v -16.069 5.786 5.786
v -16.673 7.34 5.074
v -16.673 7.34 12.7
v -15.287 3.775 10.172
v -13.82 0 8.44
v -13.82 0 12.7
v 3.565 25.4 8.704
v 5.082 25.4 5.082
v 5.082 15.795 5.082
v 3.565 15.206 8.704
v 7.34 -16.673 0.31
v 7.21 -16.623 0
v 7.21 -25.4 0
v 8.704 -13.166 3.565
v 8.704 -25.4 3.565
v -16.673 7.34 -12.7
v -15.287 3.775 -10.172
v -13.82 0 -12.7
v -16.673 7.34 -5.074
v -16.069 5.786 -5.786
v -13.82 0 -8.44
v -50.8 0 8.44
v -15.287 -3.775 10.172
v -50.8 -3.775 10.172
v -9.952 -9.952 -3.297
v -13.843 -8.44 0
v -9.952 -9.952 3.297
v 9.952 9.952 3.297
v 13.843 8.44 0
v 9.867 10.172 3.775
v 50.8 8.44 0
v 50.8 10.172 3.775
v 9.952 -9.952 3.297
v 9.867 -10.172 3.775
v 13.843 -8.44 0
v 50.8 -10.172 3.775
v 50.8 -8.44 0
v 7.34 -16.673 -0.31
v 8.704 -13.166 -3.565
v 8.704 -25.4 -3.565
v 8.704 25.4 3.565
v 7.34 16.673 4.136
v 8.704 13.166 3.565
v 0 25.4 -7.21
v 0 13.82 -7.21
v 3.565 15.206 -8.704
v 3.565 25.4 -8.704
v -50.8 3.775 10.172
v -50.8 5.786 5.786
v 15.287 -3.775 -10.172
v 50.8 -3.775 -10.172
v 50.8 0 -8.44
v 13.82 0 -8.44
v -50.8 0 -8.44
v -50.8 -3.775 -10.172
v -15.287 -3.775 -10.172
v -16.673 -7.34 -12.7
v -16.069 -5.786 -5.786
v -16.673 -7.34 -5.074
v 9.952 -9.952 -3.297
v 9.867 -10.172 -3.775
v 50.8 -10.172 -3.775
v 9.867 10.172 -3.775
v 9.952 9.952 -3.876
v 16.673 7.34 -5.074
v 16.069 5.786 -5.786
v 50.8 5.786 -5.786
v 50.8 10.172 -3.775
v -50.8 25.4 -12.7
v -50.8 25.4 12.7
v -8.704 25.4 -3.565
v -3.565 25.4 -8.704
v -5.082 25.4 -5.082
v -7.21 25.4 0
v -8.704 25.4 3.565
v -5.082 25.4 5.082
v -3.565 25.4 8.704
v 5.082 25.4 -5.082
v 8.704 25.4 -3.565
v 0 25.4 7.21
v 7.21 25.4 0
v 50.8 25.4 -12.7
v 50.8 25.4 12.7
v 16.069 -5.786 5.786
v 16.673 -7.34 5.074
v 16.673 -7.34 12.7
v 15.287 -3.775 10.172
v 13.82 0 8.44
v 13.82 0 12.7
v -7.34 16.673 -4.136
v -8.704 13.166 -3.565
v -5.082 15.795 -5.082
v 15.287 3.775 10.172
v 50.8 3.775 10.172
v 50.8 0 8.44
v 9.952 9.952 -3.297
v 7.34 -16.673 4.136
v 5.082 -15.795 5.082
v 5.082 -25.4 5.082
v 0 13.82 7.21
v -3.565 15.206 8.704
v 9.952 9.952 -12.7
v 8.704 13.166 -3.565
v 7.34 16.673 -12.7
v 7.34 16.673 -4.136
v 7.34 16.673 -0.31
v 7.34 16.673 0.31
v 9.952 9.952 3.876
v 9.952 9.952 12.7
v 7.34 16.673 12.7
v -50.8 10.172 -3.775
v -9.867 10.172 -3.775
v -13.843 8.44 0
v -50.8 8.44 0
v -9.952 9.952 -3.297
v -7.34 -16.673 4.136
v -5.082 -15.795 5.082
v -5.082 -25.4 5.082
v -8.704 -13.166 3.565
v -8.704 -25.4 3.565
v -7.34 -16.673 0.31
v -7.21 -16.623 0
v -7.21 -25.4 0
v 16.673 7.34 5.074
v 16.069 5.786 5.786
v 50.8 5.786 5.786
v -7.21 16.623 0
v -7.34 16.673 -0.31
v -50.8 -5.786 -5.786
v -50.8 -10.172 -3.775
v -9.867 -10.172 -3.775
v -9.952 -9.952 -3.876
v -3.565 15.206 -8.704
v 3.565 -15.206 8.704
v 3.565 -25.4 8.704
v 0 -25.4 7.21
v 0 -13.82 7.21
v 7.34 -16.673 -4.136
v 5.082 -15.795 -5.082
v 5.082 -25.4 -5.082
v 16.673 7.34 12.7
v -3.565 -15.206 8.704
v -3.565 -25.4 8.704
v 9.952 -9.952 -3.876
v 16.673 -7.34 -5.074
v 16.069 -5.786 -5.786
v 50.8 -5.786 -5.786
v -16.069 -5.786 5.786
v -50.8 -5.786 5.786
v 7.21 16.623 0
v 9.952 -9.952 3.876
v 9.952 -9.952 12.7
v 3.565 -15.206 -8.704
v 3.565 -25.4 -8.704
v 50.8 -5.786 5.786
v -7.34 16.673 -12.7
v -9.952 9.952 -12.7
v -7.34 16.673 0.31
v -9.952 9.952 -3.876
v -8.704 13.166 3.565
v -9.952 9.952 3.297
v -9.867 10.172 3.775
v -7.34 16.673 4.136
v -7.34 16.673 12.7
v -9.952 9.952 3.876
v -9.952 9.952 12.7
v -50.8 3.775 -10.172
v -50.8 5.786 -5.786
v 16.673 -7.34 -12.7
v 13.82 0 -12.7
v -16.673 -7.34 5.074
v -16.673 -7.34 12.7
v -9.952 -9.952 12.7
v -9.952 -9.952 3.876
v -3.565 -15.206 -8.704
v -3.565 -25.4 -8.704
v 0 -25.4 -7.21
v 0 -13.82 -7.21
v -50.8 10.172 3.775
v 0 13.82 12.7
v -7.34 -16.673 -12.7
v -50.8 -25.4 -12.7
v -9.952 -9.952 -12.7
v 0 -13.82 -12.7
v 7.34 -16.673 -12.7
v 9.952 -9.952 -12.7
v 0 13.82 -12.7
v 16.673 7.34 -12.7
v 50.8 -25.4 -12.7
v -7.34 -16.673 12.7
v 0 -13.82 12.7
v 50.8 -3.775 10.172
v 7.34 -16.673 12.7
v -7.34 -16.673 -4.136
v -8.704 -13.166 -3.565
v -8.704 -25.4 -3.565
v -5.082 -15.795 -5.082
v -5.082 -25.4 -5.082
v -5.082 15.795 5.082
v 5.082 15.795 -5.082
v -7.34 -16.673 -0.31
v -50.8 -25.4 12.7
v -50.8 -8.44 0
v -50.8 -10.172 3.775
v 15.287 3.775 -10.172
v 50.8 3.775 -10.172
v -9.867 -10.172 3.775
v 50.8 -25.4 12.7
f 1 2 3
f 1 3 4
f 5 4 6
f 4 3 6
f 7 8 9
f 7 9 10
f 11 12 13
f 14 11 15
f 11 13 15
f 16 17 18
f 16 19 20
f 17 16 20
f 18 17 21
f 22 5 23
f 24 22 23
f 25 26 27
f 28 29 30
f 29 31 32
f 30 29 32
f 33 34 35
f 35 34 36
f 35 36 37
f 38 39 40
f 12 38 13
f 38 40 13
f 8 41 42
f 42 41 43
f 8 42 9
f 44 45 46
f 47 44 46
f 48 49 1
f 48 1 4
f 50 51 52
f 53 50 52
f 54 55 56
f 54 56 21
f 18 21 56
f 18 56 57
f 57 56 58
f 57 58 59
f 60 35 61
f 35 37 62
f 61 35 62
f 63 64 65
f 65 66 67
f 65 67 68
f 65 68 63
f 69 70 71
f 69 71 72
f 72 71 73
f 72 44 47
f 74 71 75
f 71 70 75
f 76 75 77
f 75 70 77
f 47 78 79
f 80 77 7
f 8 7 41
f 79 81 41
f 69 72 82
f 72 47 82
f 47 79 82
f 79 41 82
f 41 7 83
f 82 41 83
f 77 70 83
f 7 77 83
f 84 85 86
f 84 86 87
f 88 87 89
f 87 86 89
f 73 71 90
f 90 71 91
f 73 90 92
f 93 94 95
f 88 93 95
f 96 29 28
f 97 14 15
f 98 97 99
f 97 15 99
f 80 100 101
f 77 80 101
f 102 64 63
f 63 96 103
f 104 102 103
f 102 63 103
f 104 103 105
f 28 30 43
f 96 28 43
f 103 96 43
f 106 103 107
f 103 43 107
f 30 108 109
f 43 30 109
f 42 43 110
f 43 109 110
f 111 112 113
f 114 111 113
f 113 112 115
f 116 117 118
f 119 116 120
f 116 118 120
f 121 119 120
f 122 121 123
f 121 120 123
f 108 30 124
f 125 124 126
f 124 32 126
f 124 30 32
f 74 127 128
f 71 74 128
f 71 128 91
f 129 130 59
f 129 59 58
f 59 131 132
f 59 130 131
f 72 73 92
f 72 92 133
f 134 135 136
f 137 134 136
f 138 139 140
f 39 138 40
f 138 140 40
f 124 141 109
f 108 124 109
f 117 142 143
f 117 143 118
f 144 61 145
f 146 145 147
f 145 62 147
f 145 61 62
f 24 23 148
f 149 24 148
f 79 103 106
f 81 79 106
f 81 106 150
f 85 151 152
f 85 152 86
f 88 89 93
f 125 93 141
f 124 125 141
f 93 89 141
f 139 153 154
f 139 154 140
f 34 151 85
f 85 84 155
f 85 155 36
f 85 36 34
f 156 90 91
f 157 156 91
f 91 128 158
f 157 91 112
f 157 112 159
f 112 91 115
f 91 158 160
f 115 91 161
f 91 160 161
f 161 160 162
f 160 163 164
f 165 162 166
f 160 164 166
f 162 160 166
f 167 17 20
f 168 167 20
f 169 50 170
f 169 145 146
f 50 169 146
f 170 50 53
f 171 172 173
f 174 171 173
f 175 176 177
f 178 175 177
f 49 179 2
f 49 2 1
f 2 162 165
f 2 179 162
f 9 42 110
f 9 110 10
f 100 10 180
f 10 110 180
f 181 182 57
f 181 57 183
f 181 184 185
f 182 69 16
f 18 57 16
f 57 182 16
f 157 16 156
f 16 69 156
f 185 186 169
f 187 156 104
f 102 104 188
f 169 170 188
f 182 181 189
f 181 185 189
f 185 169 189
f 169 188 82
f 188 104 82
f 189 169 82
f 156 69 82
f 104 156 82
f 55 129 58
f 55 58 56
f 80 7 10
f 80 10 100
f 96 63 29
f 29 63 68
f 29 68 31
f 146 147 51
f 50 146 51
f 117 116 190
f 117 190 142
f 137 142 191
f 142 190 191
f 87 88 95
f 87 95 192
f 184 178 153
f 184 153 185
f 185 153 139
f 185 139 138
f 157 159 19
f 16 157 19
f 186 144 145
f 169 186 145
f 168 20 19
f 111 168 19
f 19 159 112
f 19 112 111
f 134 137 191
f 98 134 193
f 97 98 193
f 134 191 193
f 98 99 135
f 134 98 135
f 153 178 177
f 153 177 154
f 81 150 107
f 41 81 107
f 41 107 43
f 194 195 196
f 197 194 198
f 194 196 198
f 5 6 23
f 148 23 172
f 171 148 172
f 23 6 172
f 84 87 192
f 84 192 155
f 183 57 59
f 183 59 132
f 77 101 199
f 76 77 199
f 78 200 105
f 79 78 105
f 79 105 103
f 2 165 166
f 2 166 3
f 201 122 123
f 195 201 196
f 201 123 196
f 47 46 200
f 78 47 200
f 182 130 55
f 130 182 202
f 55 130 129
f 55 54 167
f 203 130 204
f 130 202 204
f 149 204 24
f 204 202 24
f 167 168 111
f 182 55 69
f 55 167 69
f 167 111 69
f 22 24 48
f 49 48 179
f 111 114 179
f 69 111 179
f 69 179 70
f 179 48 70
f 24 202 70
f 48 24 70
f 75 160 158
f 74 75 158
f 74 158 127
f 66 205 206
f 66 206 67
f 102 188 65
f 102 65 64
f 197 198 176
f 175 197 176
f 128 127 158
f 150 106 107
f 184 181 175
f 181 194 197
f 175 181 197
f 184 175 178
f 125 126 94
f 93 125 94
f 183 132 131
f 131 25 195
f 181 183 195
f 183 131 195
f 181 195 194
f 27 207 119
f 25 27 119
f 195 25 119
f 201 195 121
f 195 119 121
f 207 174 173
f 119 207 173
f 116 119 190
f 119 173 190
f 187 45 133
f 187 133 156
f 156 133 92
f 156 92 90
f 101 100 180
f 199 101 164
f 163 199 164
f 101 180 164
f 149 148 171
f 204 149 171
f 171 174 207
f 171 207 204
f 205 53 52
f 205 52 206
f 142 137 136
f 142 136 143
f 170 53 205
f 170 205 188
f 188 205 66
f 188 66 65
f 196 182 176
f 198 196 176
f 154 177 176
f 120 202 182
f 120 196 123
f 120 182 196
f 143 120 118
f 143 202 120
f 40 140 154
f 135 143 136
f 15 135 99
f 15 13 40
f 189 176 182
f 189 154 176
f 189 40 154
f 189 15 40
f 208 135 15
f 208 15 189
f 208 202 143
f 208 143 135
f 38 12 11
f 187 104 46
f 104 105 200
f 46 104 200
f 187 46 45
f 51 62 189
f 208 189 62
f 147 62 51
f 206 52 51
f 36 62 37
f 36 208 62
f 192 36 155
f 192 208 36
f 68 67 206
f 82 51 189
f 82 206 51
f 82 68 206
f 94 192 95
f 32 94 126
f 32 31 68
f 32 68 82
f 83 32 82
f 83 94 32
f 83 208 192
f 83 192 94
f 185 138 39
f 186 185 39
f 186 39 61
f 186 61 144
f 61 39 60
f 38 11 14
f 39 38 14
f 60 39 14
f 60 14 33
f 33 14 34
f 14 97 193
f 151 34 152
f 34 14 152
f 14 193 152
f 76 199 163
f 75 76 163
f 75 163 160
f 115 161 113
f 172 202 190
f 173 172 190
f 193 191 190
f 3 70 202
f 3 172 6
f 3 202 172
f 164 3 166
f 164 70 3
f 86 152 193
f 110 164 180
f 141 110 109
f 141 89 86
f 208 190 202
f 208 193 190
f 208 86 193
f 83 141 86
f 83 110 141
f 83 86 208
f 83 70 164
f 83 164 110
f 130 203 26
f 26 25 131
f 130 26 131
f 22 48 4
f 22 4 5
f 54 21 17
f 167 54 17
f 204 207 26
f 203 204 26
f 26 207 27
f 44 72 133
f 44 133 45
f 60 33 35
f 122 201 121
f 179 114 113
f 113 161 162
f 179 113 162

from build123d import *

# Parameters (mm, degrees)
F0_W     = 101.6
F0_H     = 50.8
F1_DEPTH = 12.7
F3_DEPTH = 25.4
F5_DEPTH = 81.28
F7_DEPTH = 125.222


with BuildPart() as f1:
    # F0 (on Top) → F1 (new body, symmetric)
    with BuildSketch(Plane.XY):
        Rectangle(F0_W, F0_H)
    extrude(amount=F1_DEPTH, both=True)

    # F2 (on face) → F3 (cut)
    with BuildSketch(Plane.XY.offset(12.7)):
        Polygon((-13.8203132717, 0), (-16.6731197387, -7.3403669521), (-9.9523638651, -9.9523638651), align=None)
        Polygon((-16.6731197387, 7.3403669521), (-13.8203132717, 0), (-9.9523638651, 9.9523638651), align=None)
        Polygon((-9.9523638651, 9.9523638651), (-13.8203132717, 0), (-9.9523638651, -9.9523638651), (0, -13.8203132717), (9.9523638651, -9.9523638651), (13.8203132717, 0), (9.9523638651, 9.9523638651), (0, 13.8203132717), align=None)
        Polygon((0, -13.8203132717), (-9.9523638651, -9.9523638651), (-7.3403669521, -16.6731197387), align=None)
        Polygon((-7.3403669521, 16.6731197387), (-9.9523638651, 9.9523638651), (0, 13.8203132717), align=None)
        Polygon((9.9523638651, -9.9523638651), (0, -13.8203132717), (7.3403669521, -16.6731197387), align=None)
        Polygon((7.3403669521, 16.6731197387), (0, 13.8203132717), (9.9523638651, 9.9523638651), align=None)
        Polygon((13.8203132717, 0), (9.9523638651, -9.9523638651), (16.6731197387, -7.3403669521), align=None)
        Polygon((16.6731197387, 7.3403669521), (9.9523638651, 9.9523638651), (13.8203132717, 0), align=None)
    extrude(amount=-F3_DEPTH, mode=Mode.SUBTRACT)

    # F4 (on face) → F5 (cut)
    with BuildSketch(Plane.XZ.offset(25.4)):
        Polygon((-7.2104095505, 0), (-8.7035782635, -3.5653209779), (-5.0820355483, -5.0820355483), align=None)
        Polygon((-8.7035782635, 3.5653209779), (-7.2104095505, 0), (-5.0820355483, 5.0820355483), align=None)
        Polygon((-5.0820355483, 5.0820355483), (-7.2104095505, 0), (-5.0820355483, -5.0820355483), (0, -7.2104095505), (5.0820355483, -5.0820355483), (7.2104095505, 0), (5.0820355483, 5.0820355483), (0, 7.2104095505), align=None)
        Polygon((0, -7.2104095505), (-5.0820355483, -5.0820355483), (-3.5653209779, -8.7035782635), align=None)
        Polygon((-3.5653209779, 8.7035782635), (-5.0820355483, 5.0820355483), (0, 7.2104095505), align=None)
        Polygon((5.0820355483, -5.0820355483), (0, -7.2104095505), (3.5653209779, -8.7035782635), align=None)
        Polygon((3.5653209779, 8.7035782635), (0, 7.2104095505), (5.0820355483, 5.0820355483), align=None)
        Polygon((7.2104095505, 0), (5.0820355483, -5.0820355483), (8.7035782635, -3.5653209779), align=None)
        Polygon((8.7035782635, 3.5653209779), (5.0820355483, 5.0820355483), (7.2104095505, 0), align=None)
    extrude(amount=-F5_DEPTH, mode=Mode.SUBTRACT)

    # F6 (on face) → F7 (cut)
    with BuildSketch(Plane.YZ.offset(50.8)):
        Polygon((-8.4402397494, 0), (-10.1716518402, -3.7750459742), (-5.7863499024, -5.7863499024), align=None)
        Polygon((-10.1716518402, 3.7750459742), (-8.4402397494, 0), (-5.7863499024, 5.7863499024), align=None)
        Polygon((-5.7863499024, 5.7863499024), (-8.4402397494, 0), (-5.7863499024, -5.7863499024), (0, -8.4402397494), (5.7863499024, -5.7863499024), (8.4402397494, 0), (5.7863499024, 5.7863499024), (0, 8.4402397494), align=None)
        Polygon((0, -8.4402397494), (-5.7863499024, -5.7863499024), (-3.7750459742, -10.1716518402), align=None)
        Polygon((-3.7750459742, 10.1716518402), (-5.7863499024, 5.7863499024), (0, 8.4402397494), align=None)
        Polygon((5.7863499024, -5.7863499024), (0, -8.4402397494), (3.7750459742, -10.1716518402), align=None)
        Polygon((3.7750459742, 10.1716518402), (0, 8.4402397494), (5.7863499024, 5.7863499024), align=None)
        Polygon((8.4402397494, 0), (5.7863499024, -5.7863499024), (10.1716518402, -3.7750459742), align=None)
        Polygon((10.1716518402, 3.7750459742), (5.7863499024, 5.7863499024), (8.4402397494, 0), align=None)
    extrude(amount=-F7_DEPTH, mode=Mode.SUBTRACT)


solid = f1.part
